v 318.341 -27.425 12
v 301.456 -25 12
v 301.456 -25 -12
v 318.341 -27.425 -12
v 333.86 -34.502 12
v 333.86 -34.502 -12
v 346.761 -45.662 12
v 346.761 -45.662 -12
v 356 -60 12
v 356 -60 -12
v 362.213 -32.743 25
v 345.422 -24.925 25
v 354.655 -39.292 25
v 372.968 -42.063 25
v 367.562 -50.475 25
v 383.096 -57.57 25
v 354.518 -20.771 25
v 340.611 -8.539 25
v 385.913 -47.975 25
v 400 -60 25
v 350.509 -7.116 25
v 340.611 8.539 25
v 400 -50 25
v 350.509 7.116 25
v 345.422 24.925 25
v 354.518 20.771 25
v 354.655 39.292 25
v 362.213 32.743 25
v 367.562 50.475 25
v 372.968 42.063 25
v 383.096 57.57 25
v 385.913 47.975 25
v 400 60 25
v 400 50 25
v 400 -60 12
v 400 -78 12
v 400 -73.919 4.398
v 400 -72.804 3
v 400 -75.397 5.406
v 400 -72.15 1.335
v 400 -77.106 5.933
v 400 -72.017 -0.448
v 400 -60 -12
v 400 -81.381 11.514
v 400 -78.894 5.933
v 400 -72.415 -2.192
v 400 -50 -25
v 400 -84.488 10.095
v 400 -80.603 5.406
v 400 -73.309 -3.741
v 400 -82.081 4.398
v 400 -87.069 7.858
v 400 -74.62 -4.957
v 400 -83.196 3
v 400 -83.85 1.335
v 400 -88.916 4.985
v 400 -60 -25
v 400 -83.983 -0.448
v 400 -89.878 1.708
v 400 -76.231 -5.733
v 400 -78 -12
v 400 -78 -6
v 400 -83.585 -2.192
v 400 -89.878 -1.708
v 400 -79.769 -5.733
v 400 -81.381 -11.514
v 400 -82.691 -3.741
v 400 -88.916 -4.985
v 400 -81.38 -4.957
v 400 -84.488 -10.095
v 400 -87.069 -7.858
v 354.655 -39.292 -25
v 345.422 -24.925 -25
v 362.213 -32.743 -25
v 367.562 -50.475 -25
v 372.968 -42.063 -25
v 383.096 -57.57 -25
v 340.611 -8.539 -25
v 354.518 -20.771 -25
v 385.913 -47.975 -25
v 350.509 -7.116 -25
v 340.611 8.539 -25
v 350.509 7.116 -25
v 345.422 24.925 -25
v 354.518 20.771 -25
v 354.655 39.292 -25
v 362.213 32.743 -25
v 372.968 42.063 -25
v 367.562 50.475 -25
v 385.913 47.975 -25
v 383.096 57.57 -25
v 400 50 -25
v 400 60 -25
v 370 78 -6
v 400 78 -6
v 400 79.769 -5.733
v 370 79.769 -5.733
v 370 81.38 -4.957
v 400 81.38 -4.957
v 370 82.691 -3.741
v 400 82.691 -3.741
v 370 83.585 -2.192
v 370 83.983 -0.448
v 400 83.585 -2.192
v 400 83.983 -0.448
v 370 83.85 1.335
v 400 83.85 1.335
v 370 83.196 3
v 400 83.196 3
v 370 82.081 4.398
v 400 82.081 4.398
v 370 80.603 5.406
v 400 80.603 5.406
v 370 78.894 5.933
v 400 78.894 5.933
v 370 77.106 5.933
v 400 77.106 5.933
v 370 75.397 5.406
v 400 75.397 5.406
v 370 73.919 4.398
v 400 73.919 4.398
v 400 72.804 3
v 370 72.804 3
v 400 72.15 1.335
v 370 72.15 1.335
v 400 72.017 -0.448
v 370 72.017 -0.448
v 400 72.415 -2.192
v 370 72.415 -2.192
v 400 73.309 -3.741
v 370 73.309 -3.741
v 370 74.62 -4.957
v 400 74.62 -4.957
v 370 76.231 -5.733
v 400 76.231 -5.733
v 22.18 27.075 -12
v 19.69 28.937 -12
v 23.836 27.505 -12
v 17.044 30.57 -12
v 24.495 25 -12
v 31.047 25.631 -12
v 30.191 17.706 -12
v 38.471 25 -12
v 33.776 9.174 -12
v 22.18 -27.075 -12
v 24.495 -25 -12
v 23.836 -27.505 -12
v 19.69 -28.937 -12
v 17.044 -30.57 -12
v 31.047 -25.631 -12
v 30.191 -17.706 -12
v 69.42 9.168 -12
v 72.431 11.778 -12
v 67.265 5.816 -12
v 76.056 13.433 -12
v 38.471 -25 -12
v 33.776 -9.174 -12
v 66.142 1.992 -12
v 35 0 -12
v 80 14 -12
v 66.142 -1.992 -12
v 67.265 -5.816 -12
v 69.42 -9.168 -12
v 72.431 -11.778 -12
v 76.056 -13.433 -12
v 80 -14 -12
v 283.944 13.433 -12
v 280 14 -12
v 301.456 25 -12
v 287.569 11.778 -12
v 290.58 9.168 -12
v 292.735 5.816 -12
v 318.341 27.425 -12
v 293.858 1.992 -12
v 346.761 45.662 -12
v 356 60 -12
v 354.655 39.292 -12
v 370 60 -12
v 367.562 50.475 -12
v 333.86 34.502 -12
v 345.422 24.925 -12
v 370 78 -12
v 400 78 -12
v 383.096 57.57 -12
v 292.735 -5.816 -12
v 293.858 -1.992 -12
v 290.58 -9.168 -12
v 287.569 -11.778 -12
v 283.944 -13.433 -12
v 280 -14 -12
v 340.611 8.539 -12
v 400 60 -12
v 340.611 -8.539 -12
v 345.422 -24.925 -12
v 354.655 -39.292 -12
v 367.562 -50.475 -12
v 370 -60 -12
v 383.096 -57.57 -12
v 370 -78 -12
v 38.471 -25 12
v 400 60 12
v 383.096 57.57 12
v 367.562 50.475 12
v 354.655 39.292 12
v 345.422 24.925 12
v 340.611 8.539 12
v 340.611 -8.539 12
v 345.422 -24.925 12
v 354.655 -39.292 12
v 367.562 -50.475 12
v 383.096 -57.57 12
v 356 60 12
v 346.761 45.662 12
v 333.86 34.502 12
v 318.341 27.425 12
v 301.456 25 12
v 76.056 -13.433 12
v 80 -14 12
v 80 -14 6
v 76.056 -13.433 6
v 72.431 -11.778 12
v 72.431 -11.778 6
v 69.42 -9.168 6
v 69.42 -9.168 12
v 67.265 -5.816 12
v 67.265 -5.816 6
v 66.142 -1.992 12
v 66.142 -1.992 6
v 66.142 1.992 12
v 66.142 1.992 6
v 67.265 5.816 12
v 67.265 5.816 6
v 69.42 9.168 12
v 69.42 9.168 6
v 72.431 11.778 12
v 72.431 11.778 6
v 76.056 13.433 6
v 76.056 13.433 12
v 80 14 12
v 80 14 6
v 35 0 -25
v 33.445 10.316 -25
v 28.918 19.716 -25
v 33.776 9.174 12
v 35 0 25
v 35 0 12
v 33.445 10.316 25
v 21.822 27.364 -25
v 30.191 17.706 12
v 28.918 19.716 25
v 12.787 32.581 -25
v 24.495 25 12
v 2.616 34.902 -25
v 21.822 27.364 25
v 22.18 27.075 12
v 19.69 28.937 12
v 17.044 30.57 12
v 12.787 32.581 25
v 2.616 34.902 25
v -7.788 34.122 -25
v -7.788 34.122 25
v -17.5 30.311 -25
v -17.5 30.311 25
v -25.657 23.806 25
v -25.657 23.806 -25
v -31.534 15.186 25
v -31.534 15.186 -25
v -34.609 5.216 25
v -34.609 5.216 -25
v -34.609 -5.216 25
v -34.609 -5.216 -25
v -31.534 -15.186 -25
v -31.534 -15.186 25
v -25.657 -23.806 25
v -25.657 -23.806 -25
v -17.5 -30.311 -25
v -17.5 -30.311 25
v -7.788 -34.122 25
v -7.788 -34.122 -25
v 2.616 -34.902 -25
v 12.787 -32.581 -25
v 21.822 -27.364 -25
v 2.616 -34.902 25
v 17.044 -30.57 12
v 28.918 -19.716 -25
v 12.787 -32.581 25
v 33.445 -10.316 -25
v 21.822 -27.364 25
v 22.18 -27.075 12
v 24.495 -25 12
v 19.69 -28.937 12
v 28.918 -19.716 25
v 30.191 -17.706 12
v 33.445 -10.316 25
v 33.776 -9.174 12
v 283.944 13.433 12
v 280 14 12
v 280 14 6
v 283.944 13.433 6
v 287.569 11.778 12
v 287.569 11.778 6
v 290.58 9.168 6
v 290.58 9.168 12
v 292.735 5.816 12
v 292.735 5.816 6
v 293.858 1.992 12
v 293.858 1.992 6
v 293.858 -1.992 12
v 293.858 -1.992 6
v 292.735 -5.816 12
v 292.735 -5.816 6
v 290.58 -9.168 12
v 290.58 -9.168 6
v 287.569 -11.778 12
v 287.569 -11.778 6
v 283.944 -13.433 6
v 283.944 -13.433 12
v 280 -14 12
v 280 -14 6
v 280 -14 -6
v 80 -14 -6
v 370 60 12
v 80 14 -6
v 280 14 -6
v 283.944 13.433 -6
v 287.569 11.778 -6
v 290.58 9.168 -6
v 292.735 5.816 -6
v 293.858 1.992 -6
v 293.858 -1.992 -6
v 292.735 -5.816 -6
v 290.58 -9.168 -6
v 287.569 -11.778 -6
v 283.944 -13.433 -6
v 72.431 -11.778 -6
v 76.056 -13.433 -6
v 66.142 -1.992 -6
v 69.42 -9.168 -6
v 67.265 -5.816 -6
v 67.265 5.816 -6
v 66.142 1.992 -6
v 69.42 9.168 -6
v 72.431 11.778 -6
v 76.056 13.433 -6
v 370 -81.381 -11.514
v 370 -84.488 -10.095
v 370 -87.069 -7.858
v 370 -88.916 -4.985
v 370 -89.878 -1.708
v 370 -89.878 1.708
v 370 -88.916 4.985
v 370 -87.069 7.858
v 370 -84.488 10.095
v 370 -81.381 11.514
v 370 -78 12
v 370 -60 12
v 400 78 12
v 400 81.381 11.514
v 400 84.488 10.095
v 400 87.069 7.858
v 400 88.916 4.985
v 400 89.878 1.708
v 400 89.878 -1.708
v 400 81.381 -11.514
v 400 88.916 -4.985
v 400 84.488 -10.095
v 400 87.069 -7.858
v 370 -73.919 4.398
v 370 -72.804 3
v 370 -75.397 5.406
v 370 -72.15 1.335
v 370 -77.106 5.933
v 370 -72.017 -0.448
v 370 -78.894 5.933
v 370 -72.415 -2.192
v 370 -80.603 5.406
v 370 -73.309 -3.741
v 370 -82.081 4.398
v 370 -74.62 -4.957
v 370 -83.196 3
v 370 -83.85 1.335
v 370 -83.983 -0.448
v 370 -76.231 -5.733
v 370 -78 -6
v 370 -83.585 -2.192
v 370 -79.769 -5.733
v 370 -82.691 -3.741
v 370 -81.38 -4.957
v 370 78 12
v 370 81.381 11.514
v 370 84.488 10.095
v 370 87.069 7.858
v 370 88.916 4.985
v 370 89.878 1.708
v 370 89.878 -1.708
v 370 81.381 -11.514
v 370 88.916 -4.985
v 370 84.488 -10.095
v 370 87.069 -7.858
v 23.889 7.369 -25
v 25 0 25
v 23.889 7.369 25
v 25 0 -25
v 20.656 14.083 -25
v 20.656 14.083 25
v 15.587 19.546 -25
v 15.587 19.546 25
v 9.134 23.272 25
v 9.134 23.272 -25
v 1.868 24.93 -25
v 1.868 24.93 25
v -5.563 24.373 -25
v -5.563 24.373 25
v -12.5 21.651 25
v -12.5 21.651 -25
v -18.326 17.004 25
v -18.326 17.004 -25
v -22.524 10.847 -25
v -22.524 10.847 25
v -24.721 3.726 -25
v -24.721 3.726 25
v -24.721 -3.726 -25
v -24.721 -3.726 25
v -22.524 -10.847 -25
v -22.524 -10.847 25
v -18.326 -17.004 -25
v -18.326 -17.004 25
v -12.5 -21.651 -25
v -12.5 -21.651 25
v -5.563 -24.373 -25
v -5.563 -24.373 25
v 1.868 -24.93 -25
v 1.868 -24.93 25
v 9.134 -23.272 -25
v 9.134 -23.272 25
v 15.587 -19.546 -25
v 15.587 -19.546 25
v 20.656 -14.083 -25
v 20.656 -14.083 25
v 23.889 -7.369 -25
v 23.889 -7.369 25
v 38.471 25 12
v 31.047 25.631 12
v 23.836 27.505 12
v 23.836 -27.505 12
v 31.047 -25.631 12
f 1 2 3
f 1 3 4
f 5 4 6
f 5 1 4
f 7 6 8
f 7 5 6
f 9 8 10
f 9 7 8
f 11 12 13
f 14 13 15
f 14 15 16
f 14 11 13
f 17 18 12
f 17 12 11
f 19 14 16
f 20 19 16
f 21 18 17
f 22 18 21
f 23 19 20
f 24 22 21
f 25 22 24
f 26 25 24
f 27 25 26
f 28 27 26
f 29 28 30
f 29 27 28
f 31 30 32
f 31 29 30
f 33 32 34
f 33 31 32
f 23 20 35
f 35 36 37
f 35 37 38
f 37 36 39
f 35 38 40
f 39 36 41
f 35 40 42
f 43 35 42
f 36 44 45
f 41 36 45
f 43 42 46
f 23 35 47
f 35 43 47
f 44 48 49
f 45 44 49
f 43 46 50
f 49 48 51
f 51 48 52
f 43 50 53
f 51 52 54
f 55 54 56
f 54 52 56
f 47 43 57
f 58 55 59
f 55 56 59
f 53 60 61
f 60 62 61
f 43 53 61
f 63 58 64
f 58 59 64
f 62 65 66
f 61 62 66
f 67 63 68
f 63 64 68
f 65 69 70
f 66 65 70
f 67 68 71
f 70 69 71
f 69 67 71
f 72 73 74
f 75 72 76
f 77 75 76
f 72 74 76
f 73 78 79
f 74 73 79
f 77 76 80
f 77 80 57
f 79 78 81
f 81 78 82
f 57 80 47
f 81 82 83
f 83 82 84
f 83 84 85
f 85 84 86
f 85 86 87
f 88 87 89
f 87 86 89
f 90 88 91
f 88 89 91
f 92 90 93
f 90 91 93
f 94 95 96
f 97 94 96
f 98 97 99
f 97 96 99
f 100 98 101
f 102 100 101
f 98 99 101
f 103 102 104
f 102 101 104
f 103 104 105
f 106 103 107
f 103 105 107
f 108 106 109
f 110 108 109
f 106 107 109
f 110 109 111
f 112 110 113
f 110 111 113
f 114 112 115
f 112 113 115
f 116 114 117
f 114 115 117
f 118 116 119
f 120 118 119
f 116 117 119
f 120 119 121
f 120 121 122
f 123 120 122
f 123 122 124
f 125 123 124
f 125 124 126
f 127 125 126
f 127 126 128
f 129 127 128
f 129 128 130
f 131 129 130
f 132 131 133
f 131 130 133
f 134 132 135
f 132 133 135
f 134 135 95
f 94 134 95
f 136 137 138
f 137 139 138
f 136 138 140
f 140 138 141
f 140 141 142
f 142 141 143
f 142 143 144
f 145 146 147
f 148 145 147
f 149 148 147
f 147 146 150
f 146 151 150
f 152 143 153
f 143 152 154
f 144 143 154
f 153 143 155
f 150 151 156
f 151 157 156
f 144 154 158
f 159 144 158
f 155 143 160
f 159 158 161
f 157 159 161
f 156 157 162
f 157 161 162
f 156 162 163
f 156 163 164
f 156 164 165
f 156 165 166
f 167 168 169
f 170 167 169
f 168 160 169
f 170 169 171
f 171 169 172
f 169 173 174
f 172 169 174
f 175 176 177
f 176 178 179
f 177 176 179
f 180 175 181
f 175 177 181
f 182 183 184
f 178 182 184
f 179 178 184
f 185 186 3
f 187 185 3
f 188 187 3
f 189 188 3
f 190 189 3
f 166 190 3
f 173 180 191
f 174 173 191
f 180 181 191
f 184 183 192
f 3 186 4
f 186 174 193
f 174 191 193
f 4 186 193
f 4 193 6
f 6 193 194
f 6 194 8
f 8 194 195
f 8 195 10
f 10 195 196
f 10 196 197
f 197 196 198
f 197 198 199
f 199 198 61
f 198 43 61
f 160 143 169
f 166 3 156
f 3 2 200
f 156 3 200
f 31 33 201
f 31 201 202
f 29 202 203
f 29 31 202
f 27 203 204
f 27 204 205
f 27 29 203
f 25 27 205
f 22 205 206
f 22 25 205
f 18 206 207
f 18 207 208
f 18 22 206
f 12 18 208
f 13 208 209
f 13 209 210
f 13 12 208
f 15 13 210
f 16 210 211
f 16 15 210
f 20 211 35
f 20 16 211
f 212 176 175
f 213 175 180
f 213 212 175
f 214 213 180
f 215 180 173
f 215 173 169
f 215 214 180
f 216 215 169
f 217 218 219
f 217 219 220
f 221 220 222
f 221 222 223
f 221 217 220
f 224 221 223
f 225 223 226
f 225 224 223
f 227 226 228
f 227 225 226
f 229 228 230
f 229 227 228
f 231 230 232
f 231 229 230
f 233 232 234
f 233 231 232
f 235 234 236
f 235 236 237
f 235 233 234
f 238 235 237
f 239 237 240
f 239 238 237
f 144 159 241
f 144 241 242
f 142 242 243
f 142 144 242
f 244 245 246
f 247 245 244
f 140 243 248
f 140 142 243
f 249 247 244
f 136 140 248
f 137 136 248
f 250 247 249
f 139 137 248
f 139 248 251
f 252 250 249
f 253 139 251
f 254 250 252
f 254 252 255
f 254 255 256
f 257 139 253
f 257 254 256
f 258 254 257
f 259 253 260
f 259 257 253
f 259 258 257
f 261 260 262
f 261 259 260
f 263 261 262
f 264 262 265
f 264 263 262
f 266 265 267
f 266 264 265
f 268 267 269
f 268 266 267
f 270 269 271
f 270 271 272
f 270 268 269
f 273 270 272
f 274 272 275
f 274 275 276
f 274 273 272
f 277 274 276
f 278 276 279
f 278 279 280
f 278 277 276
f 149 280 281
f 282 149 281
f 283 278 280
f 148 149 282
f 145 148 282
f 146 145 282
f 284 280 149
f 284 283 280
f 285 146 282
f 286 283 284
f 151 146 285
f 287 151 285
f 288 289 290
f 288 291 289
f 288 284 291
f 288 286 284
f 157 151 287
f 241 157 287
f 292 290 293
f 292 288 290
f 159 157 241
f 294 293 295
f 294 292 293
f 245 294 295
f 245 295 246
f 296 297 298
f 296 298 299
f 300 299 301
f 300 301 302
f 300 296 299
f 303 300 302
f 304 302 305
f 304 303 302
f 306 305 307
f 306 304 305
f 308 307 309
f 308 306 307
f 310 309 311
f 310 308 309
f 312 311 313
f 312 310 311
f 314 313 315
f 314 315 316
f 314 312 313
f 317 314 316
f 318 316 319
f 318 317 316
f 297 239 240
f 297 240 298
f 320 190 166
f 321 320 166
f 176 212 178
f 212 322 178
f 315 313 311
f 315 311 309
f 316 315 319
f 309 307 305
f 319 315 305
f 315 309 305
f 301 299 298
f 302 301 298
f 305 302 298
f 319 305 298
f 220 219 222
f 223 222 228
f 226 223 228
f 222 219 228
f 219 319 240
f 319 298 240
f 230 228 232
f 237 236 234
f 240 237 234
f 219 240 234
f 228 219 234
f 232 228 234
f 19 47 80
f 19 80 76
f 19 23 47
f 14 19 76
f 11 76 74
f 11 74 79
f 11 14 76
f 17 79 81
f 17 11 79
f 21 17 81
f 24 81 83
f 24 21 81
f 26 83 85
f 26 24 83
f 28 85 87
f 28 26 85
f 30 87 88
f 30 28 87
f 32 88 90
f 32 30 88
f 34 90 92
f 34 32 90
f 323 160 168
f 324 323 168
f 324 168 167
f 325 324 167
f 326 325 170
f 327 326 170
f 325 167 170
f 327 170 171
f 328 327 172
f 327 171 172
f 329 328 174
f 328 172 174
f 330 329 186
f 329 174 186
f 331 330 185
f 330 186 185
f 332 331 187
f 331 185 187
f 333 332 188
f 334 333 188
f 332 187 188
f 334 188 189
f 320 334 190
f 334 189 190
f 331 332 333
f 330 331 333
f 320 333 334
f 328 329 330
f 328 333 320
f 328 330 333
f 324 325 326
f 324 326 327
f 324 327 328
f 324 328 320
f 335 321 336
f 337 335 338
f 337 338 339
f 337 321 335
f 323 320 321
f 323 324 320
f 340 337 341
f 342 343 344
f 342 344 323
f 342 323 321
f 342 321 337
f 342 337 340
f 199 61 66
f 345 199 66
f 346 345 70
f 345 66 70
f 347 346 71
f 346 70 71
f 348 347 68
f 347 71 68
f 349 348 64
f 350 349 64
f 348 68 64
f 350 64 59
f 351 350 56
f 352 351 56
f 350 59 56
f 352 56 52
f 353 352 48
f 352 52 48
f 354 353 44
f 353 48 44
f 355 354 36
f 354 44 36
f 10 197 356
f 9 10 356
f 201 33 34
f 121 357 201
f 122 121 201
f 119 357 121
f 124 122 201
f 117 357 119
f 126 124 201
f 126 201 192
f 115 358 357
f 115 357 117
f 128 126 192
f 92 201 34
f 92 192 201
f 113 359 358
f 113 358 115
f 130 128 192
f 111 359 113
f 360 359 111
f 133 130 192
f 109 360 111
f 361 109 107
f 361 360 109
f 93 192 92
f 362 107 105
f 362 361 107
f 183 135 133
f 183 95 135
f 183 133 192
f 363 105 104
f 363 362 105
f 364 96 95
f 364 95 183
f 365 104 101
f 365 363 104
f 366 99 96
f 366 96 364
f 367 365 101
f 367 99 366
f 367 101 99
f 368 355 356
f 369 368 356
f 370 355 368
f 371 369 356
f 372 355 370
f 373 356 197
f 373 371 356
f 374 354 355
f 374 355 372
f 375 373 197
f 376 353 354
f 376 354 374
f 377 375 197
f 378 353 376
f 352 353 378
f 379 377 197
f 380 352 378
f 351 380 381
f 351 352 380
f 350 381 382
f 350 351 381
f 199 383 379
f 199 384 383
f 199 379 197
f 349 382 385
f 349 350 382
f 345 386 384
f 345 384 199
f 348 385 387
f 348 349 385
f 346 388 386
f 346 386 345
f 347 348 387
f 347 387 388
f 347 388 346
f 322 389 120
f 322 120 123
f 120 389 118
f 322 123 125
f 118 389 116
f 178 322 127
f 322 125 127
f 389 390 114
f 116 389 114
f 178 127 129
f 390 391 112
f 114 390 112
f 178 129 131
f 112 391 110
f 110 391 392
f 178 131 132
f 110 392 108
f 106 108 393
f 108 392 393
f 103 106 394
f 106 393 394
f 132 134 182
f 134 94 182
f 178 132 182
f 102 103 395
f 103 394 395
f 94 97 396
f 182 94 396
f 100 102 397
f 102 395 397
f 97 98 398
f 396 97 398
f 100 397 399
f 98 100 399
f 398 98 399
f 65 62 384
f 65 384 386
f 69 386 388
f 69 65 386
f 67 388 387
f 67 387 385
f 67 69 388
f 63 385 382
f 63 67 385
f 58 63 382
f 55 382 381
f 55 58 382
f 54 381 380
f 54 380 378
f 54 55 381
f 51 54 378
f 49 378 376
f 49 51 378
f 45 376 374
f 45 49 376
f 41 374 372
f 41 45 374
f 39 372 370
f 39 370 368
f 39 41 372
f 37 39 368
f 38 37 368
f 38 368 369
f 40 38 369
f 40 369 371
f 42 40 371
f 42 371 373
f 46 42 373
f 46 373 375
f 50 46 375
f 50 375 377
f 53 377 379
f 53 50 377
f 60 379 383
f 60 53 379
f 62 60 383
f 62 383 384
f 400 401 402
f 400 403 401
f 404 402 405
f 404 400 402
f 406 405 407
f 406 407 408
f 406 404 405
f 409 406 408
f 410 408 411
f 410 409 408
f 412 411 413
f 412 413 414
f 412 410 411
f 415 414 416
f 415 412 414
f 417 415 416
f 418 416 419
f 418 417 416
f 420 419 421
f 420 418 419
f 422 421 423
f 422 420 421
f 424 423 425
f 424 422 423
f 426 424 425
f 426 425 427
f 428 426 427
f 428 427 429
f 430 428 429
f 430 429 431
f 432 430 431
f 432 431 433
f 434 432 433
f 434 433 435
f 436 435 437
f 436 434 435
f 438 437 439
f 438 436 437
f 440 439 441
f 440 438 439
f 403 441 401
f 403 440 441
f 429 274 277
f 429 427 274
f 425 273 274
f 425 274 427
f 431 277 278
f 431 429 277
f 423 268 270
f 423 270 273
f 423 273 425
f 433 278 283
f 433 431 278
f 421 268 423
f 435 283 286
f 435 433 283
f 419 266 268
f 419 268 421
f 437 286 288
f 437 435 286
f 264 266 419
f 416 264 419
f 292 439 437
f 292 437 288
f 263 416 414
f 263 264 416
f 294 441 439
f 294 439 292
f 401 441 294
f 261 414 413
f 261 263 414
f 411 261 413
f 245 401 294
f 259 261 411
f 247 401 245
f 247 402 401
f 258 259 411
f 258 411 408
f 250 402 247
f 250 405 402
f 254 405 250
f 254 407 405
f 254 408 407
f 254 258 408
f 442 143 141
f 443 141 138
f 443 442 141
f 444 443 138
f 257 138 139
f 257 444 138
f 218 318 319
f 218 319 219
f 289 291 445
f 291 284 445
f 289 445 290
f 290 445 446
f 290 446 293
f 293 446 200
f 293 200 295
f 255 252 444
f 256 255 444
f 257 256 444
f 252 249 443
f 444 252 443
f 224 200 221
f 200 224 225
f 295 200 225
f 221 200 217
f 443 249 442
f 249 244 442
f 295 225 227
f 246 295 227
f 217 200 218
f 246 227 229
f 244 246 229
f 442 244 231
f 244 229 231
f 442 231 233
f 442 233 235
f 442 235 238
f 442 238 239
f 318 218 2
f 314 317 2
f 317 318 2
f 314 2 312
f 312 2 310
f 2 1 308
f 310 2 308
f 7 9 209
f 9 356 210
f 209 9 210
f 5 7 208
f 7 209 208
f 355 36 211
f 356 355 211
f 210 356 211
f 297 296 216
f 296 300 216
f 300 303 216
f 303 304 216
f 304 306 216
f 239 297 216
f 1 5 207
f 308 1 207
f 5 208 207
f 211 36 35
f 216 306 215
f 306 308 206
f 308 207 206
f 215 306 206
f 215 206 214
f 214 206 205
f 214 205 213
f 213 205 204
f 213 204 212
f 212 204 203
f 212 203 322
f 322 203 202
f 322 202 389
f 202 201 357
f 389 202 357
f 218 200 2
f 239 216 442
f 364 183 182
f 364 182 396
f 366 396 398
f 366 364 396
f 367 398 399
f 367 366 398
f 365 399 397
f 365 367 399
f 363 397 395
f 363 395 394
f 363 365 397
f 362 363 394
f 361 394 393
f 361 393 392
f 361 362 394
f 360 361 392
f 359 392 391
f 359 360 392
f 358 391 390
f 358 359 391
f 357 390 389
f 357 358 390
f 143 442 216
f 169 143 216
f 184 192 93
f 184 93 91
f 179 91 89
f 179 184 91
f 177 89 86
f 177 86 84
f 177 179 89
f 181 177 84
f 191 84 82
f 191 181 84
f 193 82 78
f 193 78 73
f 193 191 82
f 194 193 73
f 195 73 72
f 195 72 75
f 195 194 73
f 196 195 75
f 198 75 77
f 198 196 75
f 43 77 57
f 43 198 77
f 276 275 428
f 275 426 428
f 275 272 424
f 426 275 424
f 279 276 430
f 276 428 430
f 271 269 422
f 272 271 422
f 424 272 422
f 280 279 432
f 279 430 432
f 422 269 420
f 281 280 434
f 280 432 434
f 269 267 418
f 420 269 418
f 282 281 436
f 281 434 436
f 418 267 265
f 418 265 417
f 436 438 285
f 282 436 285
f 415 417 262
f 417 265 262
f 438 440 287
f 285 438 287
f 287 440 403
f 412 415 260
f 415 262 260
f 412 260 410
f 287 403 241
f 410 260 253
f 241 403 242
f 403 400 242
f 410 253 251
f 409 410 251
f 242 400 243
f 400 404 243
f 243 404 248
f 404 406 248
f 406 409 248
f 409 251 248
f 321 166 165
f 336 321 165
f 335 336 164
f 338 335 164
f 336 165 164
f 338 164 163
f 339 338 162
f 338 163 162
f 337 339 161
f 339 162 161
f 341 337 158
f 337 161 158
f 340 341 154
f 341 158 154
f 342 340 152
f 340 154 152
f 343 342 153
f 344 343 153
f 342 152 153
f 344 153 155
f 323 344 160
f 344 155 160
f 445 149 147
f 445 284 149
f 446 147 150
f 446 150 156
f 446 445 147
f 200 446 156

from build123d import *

# Parameters (mm, degrees)
SKETCH1_R             = 35
SKETCH1_R_2           = 25
BOSS_EXTRUDE1_DEPTH   = 25
BOSS_EXTRUDE1_2_DEPTH = 25
BOSS_EXTRUDE3_DEPTH   = 12
FILLET1_R             = 44
FILLET2_R             = 60
SKETCH3_R             = 6
BOSS_EXTRUDE4_DEPTH   = 30
CUT_EXTRUDE1_DEPTH    = 6


with BuildPart() as part:
    # Sketch1 → Boss-Extrude1 (new, symmetric)
    with BuildSketch(Plane.XY):
        Circle(SKETCH1_R)
        Circle(SKETCH1_R_2, mode=Mode.SUBTRACT)
    extrude(amount=BOSS_EXTRUDE1_DEPTH, both=True)



with BuildPart() as body_2:
    # Sketch1 → Boss-Extrude1 2 (new, symmetric)
    with BuildSketch(Plane.XY):
        with BuildLine():
            Line((400, 50), (400, 60))
            ThreePointArc((400, 60), (340, 0), (400, -60))
            Line((400, -60), (400, -50))
            ThreePointArc((400, -50), (350, 0), (400, 50))
        make_face()
    extrude(amount=BOSS_EXTRUDE1_2_DEPTH, both=True)


with BuildPart() as part_1:
    add(part.part)

    add(body_2.part)  # Boss-Extrude3 merges body 2
    # Sketch2 → Boss-Extrude3 (add, symmetric)
    with BuildSketch(Plane.XY):
        with BuildLine():
            Line((35, 25), (340, 25))
            Line((340, 25), (356, 60))
            Line((356, 60), (400, 60))
            ThreePointArc((400, 60), (340, 0), (400, -60))
            Line((400, -60), (356, -60))
            Line((356, -60), (340, -25))
            Line((340, -25), (35, -25))
            Line((35, -25), (24.494897428, -25))
            ThreePointArc((24.494897428, -25), (35, 0), (24.494897428, 25))
            Line((24.494897428, 25), (35, 25))
        make_face()
    extrude(amount=BOSS_EXTRUDE3_DEPTH, both=True)

    # Fillet1
    fillet1_edges = [part_1.edges().sort_by_distance(p)[0] for p in [
        (24.494897428, 25, 0),
        (24.494897428, -25, 0),
    ]]
    fillet(fillet1_edges, radius=FILLET1_R)

    # Fillet2
    # the kernel refuses this fillet: 60 mm, written as the material it adds along each edge
    with BuildSketch(Plane(origin=(340, -25, 12), x_dir=(-1, 0, 0), z_dir=(0, 0, -1))) as fillet2_piece_1_section:
        with BuildLine():
            CenterArc((FILLET2_R * 0.642393223137, -FILLET2_R), FILLET2_R, 90, 65.432828679)
            Line((-FILLET2_R * 0.267081252449, -FILLET2_R * 0.584240239732), (0, 0))
            Line((0, 0), (FILLET2_R * 0.642393223137, 0))
        make_face()
    fillet2_piece_1 = extrude(amount=24, mode=Mode.PRIVATE)
    fillet2_piece_1 = split(fillet2_piece_1, bisect_by=Plane(origin=(335.089440869, -60, 0), z_dir=(0, 1, 0)), keep=Keep.TOP, mode=Mode.PRIVATE)
    add(fillet2_piece_1)
    with BuildSketch(Plane(origin=(340, 25, 12), x_dir=(0.41575976026779565, 0.9094744755857994, 0), z_dir=(0, 0, -1))) as fillet2_piece_2_section:
        with BuildLine():
            CenterArc((FILLET2_R * 0.642393223137, -FILLET2_R), FILLET2_R, 90, 65.432828679)
            Line((-FILLET2_R * 0.267081252449, -FILLET2_R * 0.584240239732), (0, 0))
            Line((0, 0), (FILLET2_R * 0.642393223137, 0))
        make_face()
    fillet2_piece_2 = extrude(amount=24, mode=Mode.PRIVATE)
    fillet2_piece_2 = split(fillet2_piece_2, bisect_by=Plane(origin=(335.089440869, 60, 0), z_dir=(0, -1, 0)), keep=Keep.TOP, mode=Mode.PRIVATE)
    add(fillet2_piece_2)

    # Sketch3 → Boss-Extrude4 (add)
    with BuildSketch(Plane(origin=(400, 0, 0), x_dir=(0, 0, -1), z_dir=(1, 0, 0))):
        with BuildLine():
            Line((-12, 78), (-12, 60))
            Line((-12, 60), (12, 60))
            Line((12, 60), (12, 78))
            ThreePointArc((12, 78), (0, 90), (-12, 78))
        make_face()
        with Locations((0, 78)):
            Circle(SKETCH3_R, mode=Mode.SUBTRACT)
    boss_extrude4 = extrude(amount=-BOSS_EXTRUDE4_DEPTH)

    # Mirror1: Boss-Extrude4 across plane
    add(boss_extrude4.mirror(Plane.ZX))

    # Sketch4 → Cut-Extrude1 (cut)
    with BuildSketch(Plane.XY.offset(12)):
        with BuildLine():
            Line((280, -14), (80, -14))
            ThreePointArc((80, -14), (66, 0), (80, 14))
            Line((80, 14), (280, 14))
            ThreePointArc((280, 14), (294, 0), (280, -14))
        make_face()
    cut_extrude1 = extrude(amount=-CUT_EXTRUDE1_DEPTH, mode=Mode.SUBTRACT)

    # Mirror2: Cut-Extrude1 across plane
    add(cut_extrude1.mirror(Plane.XY), mode=Mode.SUBTRACT)


solid = part_1.part
